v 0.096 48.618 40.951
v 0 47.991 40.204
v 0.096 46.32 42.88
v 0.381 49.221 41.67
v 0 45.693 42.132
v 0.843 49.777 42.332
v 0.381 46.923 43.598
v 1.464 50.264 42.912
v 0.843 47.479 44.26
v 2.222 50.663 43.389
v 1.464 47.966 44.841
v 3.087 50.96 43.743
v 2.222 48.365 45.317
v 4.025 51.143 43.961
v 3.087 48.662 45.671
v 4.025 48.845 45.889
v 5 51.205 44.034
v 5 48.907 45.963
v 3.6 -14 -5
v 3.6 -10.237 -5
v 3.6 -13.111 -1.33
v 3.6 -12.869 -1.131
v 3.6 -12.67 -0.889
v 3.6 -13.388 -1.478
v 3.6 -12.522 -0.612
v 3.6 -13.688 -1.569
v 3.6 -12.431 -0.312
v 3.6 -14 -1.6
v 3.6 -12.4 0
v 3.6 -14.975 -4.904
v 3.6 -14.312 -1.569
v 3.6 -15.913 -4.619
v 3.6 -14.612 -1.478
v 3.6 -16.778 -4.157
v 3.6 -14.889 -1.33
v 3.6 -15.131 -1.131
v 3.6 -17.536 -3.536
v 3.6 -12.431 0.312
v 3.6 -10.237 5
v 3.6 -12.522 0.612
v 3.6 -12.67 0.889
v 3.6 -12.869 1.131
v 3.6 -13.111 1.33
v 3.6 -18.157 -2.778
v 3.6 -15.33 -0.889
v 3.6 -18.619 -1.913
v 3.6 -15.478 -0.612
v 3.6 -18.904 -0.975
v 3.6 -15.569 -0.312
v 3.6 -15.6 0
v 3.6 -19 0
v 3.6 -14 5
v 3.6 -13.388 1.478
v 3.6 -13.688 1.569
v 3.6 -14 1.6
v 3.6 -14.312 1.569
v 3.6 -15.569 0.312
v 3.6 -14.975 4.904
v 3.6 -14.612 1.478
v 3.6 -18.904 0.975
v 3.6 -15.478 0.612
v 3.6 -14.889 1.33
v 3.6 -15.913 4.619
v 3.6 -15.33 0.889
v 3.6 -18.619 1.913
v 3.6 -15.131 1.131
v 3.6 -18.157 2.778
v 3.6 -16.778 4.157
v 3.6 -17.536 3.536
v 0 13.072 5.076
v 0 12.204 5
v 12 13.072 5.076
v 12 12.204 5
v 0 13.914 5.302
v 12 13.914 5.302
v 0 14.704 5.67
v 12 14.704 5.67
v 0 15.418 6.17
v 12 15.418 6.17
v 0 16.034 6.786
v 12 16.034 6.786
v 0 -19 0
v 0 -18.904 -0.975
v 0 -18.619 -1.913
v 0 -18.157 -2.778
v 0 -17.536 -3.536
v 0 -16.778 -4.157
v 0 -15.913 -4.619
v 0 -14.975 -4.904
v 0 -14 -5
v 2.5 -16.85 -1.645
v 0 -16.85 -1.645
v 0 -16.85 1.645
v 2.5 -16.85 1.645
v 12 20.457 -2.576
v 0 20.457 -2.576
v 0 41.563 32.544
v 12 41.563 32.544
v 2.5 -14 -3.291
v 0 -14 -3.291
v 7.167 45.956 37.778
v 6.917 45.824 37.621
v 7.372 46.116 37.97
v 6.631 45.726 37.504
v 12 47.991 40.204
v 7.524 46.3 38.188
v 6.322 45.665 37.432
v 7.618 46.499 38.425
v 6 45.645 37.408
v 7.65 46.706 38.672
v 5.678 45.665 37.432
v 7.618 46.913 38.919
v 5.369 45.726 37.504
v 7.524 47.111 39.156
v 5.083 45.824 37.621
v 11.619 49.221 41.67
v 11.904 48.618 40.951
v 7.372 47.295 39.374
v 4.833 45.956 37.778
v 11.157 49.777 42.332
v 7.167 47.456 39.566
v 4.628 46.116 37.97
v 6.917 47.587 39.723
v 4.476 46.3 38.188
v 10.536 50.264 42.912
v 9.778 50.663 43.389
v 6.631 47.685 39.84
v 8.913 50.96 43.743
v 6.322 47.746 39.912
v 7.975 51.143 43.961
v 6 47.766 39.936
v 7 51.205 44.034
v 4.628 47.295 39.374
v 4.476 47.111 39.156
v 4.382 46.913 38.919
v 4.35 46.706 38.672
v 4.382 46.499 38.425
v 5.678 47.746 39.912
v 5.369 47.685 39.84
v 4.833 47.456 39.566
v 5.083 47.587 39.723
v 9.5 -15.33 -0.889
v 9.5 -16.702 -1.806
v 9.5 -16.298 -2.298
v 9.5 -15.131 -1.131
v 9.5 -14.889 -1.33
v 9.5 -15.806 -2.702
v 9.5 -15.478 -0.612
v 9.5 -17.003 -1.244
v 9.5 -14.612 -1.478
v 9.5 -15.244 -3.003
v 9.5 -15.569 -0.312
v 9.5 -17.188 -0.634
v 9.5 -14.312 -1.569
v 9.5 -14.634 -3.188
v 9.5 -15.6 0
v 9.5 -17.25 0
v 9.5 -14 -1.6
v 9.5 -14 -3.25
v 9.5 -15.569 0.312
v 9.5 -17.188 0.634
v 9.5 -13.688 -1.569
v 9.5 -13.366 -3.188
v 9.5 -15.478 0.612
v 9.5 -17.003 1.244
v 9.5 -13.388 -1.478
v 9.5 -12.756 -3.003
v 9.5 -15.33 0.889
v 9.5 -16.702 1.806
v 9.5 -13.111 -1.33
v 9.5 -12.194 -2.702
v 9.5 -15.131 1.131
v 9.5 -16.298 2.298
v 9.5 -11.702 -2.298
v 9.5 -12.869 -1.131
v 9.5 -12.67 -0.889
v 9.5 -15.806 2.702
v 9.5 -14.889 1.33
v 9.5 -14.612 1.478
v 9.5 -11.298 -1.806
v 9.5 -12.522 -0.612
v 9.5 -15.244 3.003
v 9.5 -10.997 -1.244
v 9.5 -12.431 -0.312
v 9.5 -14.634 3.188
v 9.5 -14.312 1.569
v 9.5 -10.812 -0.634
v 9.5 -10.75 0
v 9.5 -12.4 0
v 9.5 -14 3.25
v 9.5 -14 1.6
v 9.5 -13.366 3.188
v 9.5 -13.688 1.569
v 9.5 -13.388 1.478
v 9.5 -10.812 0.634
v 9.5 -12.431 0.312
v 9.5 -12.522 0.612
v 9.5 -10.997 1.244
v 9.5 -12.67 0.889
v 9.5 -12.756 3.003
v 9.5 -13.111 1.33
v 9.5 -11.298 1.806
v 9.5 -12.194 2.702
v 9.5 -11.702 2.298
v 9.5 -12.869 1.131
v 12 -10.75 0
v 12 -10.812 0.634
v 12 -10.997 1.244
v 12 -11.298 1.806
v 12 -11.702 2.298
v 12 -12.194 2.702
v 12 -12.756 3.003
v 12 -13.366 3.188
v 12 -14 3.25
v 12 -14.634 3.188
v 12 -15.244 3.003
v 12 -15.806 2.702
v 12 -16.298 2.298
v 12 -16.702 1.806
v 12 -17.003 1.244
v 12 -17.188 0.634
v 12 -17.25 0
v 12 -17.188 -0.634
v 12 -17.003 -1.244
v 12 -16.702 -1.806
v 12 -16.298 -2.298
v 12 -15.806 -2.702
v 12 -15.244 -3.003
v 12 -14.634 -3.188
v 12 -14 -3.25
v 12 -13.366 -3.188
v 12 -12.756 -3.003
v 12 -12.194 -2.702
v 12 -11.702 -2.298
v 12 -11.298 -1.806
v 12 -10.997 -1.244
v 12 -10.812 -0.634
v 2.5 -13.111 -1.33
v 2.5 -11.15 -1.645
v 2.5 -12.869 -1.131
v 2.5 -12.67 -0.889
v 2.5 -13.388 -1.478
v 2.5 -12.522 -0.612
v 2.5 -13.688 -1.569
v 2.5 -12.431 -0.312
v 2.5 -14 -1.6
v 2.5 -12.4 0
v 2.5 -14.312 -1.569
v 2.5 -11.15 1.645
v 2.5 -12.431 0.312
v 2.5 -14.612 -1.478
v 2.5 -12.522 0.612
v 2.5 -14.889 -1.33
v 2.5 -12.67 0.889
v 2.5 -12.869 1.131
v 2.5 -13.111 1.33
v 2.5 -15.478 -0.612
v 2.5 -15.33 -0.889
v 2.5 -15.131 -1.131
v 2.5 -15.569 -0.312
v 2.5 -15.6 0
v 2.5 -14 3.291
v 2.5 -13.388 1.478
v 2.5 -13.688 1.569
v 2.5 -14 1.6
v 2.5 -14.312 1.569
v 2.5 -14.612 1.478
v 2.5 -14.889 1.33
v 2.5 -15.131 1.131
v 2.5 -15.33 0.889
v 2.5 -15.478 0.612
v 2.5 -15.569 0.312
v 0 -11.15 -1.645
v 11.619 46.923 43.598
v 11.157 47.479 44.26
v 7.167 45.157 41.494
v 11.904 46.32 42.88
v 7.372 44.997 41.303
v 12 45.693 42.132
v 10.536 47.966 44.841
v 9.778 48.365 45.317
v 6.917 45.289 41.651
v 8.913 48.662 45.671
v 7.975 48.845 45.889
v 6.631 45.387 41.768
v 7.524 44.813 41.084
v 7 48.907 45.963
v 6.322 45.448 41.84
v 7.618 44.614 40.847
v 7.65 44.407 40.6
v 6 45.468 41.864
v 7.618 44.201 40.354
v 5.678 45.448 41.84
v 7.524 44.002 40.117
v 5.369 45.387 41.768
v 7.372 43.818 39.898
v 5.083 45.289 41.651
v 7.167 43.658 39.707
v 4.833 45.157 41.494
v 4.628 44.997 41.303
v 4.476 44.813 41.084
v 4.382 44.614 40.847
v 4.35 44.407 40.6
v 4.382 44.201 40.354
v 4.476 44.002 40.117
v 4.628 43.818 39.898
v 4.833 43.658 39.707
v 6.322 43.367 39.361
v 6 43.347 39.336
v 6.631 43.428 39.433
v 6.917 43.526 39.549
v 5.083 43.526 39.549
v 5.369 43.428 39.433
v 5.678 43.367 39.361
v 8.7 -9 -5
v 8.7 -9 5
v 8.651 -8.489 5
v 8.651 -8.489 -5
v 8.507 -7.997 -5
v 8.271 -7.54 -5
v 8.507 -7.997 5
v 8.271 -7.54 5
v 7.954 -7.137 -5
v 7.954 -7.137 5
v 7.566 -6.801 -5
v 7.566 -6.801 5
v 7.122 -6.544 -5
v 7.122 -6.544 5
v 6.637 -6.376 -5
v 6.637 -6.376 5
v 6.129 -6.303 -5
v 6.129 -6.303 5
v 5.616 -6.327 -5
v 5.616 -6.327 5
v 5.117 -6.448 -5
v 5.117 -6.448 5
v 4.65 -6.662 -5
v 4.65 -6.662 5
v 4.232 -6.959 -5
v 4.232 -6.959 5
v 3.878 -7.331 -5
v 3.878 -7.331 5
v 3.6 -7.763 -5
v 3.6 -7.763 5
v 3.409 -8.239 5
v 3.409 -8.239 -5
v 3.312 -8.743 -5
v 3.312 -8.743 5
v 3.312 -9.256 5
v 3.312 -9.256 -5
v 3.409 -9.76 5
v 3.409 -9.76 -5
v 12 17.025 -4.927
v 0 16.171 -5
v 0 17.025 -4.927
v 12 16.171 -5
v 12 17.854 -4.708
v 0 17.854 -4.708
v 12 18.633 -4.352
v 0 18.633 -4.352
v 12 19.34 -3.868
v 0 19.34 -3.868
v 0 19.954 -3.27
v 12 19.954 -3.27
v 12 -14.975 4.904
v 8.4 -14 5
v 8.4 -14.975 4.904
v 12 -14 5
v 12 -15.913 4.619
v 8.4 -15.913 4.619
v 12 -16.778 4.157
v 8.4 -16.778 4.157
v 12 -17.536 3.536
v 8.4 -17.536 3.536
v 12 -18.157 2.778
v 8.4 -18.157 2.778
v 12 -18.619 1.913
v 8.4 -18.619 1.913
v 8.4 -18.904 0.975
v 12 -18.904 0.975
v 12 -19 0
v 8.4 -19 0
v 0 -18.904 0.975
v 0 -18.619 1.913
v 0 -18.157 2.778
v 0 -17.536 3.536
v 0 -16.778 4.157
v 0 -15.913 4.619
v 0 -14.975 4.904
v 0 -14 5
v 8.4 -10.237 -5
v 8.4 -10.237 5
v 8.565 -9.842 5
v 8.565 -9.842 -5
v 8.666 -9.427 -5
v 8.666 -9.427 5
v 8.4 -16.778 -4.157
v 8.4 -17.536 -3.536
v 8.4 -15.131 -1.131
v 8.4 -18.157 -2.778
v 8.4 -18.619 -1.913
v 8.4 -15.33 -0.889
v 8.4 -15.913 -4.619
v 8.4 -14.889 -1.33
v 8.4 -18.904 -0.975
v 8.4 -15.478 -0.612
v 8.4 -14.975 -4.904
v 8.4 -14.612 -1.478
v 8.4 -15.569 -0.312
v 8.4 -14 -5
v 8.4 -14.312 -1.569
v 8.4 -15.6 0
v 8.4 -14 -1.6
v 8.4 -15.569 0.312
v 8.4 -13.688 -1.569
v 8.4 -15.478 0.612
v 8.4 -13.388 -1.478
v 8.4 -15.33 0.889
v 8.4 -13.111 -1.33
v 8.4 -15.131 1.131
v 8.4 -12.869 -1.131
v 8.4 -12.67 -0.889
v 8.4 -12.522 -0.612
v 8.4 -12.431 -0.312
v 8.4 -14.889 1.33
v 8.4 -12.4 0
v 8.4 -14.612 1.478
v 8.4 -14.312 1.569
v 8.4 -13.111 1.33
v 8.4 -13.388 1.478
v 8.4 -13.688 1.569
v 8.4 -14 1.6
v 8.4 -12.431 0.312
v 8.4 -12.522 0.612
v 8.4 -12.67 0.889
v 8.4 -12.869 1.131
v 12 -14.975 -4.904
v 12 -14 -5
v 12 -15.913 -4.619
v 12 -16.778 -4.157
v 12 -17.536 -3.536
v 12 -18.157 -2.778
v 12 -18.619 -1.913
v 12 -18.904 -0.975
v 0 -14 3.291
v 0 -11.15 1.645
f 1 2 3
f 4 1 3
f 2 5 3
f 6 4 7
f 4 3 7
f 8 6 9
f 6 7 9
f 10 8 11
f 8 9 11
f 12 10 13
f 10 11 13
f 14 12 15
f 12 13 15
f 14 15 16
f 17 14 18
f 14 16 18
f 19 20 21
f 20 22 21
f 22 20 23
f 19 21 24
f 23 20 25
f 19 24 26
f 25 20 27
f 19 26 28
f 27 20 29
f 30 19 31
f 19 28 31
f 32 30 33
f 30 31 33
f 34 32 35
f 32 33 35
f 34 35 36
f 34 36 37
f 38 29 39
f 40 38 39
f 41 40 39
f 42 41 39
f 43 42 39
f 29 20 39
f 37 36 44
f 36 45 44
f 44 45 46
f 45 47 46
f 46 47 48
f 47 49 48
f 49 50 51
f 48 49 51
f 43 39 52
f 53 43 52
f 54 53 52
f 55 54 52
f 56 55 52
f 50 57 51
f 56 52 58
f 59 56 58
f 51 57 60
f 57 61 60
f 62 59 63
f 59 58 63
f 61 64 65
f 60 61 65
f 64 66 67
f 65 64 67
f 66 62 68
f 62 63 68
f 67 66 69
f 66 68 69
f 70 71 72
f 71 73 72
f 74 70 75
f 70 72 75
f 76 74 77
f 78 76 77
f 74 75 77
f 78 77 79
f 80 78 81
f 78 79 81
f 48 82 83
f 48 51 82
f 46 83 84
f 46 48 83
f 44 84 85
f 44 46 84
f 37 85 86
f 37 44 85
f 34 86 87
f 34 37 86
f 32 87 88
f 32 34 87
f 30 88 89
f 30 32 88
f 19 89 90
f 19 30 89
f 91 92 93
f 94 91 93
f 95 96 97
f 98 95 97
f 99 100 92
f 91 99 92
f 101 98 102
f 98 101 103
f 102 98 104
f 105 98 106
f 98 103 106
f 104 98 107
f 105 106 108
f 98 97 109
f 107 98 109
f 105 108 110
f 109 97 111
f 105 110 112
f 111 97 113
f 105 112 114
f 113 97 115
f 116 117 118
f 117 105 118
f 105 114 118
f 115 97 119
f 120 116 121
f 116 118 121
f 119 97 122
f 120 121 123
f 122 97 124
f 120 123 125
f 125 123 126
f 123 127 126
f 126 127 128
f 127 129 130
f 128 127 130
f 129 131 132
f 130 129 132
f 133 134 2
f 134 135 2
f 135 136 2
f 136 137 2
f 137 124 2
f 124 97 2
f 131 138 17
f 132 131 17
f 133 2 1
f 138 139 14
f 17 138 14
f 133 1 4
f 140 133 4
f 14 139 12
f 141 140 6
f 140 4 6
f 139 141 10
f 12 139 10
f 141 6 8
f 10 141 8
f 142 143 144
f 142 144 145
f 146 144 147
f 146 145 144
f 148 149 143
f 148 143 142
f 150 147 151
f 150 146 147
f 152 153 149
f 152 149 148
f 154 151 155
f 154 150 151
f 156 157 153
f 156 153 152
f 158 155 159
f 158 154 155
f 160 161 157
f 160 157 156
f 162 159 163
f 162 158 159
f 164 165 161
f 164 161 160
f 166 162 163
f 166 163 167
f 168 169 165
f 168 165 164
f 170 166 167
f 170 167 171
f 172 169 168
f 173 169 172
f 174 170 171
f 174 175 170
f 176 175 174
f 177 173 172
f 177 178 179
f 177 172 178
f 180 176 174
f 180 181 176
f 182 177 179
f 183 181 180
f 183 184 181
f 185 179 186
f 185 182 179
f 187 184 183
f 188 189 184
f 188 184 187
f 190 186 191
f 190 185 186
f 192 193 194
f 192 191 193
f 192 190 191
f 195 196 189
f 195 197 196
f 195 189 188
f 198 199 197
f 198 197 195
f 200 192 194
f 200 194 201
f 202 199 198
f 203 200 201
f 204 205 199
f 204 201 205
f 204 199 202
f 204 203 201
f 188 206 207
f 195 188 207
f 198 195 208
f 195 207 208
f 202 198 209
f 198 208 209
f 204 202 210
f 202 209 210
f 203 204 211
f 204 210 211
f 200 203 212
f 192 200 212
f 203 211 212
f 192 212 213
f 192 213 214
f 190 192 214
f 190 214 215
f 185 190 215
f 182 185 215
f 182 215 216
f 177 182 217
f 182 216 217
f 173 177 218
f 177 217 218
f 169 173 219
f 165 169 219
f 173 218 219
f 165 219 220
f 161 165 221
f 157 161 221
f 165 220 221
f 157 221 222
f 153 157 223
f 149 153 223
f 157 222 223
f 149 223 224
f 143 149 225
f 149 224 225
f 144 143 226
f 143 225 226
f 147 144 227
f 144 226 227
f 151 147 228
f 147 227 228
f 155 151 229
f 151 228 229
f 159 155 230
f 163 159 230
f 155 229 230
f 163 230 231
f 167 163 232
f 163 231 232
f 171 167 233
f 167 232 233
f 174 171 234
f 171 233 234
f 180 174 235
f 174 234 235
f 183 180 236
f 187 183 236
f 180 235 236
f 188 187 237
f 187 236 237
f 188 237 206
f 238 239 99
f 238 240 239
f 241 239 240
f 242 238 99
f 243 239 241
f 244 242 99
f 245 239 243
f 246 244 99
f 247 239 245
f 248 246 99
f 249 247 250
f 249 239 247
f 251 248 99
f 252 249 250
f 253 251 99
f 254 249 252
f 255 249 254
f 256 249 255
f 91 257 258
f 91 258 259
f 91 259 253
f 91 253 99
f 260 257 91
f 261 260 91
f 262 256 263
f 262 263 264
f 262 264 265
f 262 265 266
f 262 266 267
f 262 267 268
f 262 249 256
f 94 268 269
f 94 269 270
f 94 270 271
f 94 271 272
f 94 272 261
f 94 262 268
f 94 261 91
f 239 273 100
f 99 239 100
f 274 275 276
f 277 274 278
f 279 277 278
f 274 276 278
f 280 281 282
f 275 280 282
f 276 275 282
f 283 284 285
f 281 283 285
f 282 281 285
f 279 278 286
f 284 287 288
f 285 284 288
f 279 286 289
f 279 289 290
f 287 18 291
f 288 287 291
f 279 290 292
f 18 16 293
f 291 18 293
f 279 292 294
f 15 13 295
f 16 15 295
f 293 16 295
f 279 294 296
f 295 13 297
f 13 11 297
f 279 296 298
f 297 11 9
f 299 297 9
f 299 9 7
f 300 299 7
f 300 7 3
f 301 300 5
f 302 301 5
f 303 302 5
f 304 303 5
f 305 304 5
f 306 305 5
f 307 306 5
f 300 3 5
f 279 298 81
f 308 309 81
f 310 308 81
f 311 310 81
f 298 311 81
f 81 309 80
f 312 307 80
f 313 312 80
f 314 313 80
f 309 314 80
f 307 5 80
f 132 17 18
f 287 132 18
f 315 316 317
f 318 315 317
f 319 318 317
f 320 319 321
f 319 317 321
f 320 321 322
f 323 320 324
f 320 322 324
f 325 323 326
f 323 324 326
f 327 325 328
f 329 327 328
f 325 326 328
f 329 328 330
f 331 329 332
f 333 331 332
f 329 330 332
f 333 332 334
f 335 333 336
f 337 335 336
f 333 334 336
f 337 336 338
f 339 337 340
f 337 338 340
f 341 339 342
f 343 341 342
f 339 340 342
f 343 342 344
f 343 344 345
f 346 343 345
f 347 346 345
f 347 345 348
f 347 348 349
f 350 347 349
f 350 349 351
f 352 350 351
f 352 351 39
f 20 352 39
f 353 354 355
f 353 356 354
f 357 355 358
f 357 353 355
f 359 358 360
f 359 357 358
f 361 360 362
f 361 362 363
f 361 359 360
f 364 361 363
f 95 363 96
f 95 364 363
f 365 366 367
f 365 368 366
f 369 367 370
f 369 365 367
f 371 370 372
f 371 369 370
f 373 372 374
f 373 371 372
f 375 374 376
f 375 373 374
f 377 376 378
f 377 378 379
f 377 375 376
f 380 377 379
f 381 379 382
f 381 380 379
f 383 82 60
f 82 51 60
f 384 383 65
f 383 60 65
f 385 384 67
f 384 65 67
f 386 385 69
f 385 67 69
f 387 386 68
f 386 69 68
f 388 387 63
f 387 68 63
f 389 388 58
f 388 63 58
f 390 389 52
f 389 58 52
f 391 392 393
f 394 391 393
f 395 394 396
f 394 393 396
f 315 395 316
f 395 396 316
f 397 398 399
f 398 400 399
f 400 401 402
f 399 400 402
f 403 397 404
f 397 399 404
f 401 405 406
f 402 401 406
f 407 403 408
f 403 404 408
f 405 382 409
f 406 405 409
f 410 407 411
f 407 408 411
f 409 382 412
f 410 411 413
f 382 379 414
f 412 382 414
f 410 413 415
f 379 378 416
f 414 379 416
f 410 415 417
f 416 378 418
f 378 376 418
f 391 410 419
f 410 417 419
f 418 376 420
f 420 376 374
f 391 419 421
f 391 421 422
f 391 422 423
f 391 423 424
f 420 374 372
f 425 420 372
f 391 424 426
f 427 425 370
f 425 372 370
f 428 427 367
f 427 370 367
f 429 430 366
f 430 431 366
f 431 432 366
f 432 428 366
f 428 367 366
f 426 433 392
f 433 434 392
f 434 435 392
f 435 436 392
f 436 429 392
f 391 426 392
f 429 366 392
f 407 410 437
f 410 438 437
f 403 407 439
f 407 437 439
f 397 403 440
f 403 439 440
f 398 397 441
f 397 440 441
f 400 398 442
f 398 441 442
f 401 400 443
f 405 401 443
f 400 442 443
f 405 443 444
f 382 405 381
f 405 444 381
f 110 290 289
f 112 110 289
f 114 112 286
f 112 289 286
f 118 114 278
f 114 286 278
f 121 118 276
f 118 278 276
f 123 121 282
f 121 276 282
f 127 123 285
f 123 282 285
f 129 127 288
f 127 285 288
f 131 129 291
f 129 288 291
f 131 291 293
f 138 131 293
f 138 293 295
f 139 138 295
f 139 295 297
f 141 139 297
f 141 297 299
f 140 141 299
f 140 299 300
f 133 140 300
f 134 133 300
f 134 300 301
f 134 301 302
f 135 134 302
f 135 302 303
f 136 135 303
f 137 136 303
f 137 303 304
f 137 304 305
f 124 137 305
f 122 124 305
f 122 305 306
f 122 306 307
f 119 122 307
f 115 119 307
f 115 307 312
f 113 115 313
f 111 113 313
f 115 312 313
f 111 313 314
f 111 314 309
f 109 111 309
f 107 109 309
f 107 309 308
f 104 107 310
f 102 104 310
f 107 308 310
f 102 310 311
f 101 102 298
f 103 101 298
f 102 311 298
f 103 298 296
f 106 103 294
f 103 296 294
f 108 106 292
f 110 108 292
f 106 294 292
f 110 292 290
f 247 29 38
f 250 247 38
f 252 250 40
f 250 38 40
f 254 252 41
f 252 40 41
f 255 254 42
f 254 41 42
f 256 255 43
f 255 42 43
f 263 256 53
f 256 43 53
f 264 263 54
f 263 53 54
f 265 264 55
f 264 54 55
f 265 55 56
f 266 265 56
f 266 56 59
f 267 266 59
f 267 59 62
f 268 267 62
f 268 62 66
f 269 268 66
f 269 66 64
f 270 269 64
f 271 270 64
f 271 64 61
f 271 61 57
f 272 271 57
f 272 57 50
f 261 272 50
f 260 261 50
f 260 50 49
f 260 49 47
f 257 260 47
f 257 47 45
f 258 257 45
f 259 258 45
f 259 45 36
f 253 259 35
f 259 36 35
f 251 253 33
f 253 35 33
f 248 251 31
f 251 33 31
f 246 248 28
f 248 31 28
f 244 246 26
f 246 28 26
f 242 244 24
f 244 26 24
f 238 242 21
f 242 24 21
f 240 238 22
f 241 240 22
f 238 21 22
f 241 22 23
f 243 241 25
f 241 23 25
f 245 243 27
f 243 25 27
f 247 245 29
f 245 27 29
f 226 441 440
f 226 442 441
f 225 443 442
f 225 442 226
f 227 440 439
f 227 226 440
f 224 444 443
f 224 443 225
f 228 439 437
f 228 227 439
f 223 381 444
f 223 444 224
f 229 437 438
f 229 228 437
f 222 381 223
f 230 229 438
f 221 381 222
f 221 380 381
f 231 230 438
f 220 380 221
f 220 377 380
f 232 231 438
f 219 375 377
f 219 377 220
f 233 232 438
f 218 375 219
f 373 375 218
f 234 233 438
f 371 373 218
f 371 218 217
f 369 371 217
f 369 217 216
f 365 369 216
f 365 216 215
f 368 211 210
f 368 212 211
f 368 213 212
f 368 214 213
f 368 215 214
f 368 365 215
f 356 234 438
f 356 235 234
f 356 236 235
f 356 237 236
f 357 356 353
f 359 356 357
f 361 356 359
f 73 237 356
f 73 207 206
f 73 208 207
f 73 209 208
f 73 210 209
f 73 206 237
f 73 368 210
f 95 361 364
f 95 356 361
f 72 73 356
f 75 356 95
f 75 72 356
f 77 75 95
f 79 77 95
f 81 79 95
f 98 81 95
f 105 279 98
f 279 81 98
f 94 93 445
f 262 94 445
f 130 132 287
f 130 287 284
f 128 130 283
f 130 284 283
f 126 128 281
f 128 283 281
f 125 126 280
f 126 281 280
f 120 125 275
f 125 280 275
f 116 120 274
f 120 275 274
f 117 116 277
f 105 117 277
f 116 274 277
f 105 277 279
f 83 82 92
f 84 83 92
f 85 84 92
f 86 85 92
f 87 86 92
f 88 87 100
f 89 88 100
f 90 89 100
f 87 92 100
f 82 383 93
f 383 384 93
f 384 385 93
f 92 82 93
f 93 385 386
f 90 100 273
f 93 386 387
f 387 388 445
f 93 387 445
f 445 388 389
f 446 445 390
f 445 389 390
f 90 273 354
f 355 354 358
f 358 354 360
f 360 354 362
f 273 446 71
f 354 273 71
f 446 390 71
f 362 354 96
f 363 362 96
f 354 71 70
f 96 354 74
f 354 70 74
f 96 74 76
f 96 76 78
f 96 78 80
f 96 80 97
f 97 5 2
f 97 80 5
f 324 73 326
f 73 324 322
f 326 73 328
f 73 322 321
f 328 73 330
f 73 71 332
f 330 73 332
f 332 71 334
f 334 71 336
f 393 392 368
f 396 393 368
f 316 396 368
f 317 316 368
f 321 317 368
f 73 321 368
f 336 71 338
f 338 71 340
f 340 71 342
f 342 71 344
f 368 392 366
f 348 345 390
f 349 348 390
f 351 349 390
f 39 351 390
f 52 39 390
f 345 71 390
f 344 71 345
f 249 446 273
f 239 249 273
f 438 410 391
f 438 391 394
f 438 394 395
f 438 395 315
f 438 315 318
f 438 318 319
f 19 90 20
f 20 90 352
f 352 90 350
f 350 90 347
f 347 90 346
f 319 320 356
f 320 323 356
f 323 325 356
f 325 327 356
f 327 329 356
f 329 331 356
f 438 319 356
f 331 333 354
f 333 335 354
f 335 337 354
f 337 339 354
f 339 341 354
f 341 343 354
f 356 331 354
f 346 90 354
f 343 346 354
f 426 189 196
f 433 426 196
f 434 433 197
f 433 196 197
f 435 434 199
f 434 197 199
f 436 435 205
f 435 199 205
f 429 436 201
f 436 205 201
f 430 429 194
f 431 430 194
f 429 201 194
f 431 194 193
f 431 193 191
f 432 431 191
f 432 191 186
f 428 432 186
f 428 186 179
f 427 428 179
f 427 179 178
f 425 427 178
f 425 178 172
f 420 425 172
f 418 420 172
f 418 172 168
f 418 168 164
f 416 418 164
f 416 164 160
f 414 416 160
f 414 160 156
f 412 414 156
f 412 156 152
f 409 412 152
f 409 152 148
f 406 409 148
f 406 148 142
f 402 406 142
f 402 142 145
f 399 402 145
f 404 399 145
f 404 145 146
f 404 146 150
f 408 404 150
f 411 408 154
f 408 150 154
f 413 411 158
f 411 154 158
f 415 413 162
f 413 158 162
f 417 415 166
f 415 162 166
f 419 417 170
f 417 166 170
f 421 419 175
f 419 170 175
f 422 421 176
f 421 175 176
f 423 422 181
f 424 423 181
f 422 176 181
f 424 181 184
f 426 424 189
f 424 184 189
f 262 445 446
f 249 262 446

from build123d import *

# Parameters (mm, degrees)
F1_DEPTH  = 12
F3_DEPTH  = 25
F4_R      = 1.6
F5_DEPTH  = 12.001
F4_R_2    = 3.25
F6_DEPTH  = 2.5
F8_DEPTH  = 2.5
F9_R      = 1.65
F10_DEPTH = 34.5196429053
F11_R     = 4.99999


# Not quite as in the source:
# - a fillet or chamfer is up to 0.001 mm smaller than in the source, because OpenCascade refuses the exact size


with BuildPart() as f1:
    # F0 (on Right) → F1 (new body)
    with BuildSketch(Plane.YZ):
        Polygon((-19, 5), (-19, -5), (19, -5), (10.3397459622, 0), (14.535244118, 5), align=None)
        Polygon((10.3397459622, 0), (19, -5), (19, 5), (14.535244118, 5), align=None)
        Polygon((19, 5), (19, -5), (41.5633217274, 32.5436371113), (51.2051358727, 44.0343037581), (48.9070025433, 45.9626665871), (14.535244118, 5), align=None)
    extrude(amount=F1_DEPTH)

    # F2 (on face) → F3 (cut)
    with BuildSketch(Plane.XY.offset(5)):
        with BuildLine():
            ThreePointArc((8.4, -10.2369316877), (8.6239283527, -9.6363961031), (8.7, -9))
            ThreePointArc((8.7, -9), (5.3636038969, -6.3760716473), (3.6, -10.2369316877))
            Line((3.6, -10.2369316877), (8.4, -10.2369316877))
        make_face()
        with BuildLine():
            Line((8.4, -10.2369316877), (3.6, -10.2369316877))
            ThreePointArc((3.6, -10.2369316877), (6, -11.7), (8.4, -10.2369316877))
        make_face()
        with BuildLine():
            ThreePointArc((8.4, -10.2369316877), (6, -11.7), (3.6, -10.2369316877))
            Line((3.6, -10.2369316877), (3.6, -19))
            Line((3.6, -19), (8.4, -19))
            Line((8.4, -19), (8.4, -10.2369316877))
        make_face()
    extrude(amount=-F3_DEPTH, mode=Mode.SUBTRACT)

    # F4 (on face) → F5 (cut, through all)
    with BuildSketch(Plane.YZ.offset(12)):
        with Locations((-14, 0)):
            Circle(F4_R)
    extrude(amount=-F5_DEPTH, mode=Mode.SUBTRACT)

    # F4 (on face) → F6 (cut)
    with BuildSketch(Plane.YZ.offset(12)):
        with Locations((-14, 0)):
            Circle(F4_R_2)
        with Locations((-14, 0)):
            Circle(F4_R, mode=Mode.SUBTRACT)
    extrude(amount=-F6_DEPTH, mode=Mode.SUBTRACT)

    # F7 (on face) → F8 (cut)
    with BuildSketch(Plane(origin=(0, 0, 0), x_dir=(0, -1, 0), z_dir=(-1, 0, 0))):
        Polygon((11.15, 1.6454482672), (11.15, -1.6454482672), (14, -3.2908965344), (16.85, -1.6454482672), (16.85, 1.6454482672), (14, 3.2908965344), align=None)
    extrude(amount=-F8_DEPTH, mode=Mode.SUBTRACT)

    # F9 (on face) → F10 (cut, through all)
    with BuildSketch(Plane(origin=(0, 6.067612003, -5.0913309939), x_dir=(1, 0, 0), z_dir=(0, -0.7660444431, 0.6427876097))):
        with Locations((6, 59.6462605918)):
            Circle(F9_R)
    extrude(amount=-F10_DEPTH, mode=Mode.SUBTRACT)

    # F11 (radius 5 in the source; OpenCascade refuses exactly that, so slightly less here)
    f11_edges = [f1.edges().sort_by_distance(p)[0] for p in [
        (1.8, -19, 5),
        (10.2, -19, 5),
        (1.8, -19, -5),
        (10.2, -19, -5),
        (12, 50.056069, 44.998485),
        (0, 50.056069, 44.998485),
        (6, 14.535244, 5),
        (6, 19, -5),
    ]]
    fillet(f11_edges, radius=F11_R)


solid = f1.part
